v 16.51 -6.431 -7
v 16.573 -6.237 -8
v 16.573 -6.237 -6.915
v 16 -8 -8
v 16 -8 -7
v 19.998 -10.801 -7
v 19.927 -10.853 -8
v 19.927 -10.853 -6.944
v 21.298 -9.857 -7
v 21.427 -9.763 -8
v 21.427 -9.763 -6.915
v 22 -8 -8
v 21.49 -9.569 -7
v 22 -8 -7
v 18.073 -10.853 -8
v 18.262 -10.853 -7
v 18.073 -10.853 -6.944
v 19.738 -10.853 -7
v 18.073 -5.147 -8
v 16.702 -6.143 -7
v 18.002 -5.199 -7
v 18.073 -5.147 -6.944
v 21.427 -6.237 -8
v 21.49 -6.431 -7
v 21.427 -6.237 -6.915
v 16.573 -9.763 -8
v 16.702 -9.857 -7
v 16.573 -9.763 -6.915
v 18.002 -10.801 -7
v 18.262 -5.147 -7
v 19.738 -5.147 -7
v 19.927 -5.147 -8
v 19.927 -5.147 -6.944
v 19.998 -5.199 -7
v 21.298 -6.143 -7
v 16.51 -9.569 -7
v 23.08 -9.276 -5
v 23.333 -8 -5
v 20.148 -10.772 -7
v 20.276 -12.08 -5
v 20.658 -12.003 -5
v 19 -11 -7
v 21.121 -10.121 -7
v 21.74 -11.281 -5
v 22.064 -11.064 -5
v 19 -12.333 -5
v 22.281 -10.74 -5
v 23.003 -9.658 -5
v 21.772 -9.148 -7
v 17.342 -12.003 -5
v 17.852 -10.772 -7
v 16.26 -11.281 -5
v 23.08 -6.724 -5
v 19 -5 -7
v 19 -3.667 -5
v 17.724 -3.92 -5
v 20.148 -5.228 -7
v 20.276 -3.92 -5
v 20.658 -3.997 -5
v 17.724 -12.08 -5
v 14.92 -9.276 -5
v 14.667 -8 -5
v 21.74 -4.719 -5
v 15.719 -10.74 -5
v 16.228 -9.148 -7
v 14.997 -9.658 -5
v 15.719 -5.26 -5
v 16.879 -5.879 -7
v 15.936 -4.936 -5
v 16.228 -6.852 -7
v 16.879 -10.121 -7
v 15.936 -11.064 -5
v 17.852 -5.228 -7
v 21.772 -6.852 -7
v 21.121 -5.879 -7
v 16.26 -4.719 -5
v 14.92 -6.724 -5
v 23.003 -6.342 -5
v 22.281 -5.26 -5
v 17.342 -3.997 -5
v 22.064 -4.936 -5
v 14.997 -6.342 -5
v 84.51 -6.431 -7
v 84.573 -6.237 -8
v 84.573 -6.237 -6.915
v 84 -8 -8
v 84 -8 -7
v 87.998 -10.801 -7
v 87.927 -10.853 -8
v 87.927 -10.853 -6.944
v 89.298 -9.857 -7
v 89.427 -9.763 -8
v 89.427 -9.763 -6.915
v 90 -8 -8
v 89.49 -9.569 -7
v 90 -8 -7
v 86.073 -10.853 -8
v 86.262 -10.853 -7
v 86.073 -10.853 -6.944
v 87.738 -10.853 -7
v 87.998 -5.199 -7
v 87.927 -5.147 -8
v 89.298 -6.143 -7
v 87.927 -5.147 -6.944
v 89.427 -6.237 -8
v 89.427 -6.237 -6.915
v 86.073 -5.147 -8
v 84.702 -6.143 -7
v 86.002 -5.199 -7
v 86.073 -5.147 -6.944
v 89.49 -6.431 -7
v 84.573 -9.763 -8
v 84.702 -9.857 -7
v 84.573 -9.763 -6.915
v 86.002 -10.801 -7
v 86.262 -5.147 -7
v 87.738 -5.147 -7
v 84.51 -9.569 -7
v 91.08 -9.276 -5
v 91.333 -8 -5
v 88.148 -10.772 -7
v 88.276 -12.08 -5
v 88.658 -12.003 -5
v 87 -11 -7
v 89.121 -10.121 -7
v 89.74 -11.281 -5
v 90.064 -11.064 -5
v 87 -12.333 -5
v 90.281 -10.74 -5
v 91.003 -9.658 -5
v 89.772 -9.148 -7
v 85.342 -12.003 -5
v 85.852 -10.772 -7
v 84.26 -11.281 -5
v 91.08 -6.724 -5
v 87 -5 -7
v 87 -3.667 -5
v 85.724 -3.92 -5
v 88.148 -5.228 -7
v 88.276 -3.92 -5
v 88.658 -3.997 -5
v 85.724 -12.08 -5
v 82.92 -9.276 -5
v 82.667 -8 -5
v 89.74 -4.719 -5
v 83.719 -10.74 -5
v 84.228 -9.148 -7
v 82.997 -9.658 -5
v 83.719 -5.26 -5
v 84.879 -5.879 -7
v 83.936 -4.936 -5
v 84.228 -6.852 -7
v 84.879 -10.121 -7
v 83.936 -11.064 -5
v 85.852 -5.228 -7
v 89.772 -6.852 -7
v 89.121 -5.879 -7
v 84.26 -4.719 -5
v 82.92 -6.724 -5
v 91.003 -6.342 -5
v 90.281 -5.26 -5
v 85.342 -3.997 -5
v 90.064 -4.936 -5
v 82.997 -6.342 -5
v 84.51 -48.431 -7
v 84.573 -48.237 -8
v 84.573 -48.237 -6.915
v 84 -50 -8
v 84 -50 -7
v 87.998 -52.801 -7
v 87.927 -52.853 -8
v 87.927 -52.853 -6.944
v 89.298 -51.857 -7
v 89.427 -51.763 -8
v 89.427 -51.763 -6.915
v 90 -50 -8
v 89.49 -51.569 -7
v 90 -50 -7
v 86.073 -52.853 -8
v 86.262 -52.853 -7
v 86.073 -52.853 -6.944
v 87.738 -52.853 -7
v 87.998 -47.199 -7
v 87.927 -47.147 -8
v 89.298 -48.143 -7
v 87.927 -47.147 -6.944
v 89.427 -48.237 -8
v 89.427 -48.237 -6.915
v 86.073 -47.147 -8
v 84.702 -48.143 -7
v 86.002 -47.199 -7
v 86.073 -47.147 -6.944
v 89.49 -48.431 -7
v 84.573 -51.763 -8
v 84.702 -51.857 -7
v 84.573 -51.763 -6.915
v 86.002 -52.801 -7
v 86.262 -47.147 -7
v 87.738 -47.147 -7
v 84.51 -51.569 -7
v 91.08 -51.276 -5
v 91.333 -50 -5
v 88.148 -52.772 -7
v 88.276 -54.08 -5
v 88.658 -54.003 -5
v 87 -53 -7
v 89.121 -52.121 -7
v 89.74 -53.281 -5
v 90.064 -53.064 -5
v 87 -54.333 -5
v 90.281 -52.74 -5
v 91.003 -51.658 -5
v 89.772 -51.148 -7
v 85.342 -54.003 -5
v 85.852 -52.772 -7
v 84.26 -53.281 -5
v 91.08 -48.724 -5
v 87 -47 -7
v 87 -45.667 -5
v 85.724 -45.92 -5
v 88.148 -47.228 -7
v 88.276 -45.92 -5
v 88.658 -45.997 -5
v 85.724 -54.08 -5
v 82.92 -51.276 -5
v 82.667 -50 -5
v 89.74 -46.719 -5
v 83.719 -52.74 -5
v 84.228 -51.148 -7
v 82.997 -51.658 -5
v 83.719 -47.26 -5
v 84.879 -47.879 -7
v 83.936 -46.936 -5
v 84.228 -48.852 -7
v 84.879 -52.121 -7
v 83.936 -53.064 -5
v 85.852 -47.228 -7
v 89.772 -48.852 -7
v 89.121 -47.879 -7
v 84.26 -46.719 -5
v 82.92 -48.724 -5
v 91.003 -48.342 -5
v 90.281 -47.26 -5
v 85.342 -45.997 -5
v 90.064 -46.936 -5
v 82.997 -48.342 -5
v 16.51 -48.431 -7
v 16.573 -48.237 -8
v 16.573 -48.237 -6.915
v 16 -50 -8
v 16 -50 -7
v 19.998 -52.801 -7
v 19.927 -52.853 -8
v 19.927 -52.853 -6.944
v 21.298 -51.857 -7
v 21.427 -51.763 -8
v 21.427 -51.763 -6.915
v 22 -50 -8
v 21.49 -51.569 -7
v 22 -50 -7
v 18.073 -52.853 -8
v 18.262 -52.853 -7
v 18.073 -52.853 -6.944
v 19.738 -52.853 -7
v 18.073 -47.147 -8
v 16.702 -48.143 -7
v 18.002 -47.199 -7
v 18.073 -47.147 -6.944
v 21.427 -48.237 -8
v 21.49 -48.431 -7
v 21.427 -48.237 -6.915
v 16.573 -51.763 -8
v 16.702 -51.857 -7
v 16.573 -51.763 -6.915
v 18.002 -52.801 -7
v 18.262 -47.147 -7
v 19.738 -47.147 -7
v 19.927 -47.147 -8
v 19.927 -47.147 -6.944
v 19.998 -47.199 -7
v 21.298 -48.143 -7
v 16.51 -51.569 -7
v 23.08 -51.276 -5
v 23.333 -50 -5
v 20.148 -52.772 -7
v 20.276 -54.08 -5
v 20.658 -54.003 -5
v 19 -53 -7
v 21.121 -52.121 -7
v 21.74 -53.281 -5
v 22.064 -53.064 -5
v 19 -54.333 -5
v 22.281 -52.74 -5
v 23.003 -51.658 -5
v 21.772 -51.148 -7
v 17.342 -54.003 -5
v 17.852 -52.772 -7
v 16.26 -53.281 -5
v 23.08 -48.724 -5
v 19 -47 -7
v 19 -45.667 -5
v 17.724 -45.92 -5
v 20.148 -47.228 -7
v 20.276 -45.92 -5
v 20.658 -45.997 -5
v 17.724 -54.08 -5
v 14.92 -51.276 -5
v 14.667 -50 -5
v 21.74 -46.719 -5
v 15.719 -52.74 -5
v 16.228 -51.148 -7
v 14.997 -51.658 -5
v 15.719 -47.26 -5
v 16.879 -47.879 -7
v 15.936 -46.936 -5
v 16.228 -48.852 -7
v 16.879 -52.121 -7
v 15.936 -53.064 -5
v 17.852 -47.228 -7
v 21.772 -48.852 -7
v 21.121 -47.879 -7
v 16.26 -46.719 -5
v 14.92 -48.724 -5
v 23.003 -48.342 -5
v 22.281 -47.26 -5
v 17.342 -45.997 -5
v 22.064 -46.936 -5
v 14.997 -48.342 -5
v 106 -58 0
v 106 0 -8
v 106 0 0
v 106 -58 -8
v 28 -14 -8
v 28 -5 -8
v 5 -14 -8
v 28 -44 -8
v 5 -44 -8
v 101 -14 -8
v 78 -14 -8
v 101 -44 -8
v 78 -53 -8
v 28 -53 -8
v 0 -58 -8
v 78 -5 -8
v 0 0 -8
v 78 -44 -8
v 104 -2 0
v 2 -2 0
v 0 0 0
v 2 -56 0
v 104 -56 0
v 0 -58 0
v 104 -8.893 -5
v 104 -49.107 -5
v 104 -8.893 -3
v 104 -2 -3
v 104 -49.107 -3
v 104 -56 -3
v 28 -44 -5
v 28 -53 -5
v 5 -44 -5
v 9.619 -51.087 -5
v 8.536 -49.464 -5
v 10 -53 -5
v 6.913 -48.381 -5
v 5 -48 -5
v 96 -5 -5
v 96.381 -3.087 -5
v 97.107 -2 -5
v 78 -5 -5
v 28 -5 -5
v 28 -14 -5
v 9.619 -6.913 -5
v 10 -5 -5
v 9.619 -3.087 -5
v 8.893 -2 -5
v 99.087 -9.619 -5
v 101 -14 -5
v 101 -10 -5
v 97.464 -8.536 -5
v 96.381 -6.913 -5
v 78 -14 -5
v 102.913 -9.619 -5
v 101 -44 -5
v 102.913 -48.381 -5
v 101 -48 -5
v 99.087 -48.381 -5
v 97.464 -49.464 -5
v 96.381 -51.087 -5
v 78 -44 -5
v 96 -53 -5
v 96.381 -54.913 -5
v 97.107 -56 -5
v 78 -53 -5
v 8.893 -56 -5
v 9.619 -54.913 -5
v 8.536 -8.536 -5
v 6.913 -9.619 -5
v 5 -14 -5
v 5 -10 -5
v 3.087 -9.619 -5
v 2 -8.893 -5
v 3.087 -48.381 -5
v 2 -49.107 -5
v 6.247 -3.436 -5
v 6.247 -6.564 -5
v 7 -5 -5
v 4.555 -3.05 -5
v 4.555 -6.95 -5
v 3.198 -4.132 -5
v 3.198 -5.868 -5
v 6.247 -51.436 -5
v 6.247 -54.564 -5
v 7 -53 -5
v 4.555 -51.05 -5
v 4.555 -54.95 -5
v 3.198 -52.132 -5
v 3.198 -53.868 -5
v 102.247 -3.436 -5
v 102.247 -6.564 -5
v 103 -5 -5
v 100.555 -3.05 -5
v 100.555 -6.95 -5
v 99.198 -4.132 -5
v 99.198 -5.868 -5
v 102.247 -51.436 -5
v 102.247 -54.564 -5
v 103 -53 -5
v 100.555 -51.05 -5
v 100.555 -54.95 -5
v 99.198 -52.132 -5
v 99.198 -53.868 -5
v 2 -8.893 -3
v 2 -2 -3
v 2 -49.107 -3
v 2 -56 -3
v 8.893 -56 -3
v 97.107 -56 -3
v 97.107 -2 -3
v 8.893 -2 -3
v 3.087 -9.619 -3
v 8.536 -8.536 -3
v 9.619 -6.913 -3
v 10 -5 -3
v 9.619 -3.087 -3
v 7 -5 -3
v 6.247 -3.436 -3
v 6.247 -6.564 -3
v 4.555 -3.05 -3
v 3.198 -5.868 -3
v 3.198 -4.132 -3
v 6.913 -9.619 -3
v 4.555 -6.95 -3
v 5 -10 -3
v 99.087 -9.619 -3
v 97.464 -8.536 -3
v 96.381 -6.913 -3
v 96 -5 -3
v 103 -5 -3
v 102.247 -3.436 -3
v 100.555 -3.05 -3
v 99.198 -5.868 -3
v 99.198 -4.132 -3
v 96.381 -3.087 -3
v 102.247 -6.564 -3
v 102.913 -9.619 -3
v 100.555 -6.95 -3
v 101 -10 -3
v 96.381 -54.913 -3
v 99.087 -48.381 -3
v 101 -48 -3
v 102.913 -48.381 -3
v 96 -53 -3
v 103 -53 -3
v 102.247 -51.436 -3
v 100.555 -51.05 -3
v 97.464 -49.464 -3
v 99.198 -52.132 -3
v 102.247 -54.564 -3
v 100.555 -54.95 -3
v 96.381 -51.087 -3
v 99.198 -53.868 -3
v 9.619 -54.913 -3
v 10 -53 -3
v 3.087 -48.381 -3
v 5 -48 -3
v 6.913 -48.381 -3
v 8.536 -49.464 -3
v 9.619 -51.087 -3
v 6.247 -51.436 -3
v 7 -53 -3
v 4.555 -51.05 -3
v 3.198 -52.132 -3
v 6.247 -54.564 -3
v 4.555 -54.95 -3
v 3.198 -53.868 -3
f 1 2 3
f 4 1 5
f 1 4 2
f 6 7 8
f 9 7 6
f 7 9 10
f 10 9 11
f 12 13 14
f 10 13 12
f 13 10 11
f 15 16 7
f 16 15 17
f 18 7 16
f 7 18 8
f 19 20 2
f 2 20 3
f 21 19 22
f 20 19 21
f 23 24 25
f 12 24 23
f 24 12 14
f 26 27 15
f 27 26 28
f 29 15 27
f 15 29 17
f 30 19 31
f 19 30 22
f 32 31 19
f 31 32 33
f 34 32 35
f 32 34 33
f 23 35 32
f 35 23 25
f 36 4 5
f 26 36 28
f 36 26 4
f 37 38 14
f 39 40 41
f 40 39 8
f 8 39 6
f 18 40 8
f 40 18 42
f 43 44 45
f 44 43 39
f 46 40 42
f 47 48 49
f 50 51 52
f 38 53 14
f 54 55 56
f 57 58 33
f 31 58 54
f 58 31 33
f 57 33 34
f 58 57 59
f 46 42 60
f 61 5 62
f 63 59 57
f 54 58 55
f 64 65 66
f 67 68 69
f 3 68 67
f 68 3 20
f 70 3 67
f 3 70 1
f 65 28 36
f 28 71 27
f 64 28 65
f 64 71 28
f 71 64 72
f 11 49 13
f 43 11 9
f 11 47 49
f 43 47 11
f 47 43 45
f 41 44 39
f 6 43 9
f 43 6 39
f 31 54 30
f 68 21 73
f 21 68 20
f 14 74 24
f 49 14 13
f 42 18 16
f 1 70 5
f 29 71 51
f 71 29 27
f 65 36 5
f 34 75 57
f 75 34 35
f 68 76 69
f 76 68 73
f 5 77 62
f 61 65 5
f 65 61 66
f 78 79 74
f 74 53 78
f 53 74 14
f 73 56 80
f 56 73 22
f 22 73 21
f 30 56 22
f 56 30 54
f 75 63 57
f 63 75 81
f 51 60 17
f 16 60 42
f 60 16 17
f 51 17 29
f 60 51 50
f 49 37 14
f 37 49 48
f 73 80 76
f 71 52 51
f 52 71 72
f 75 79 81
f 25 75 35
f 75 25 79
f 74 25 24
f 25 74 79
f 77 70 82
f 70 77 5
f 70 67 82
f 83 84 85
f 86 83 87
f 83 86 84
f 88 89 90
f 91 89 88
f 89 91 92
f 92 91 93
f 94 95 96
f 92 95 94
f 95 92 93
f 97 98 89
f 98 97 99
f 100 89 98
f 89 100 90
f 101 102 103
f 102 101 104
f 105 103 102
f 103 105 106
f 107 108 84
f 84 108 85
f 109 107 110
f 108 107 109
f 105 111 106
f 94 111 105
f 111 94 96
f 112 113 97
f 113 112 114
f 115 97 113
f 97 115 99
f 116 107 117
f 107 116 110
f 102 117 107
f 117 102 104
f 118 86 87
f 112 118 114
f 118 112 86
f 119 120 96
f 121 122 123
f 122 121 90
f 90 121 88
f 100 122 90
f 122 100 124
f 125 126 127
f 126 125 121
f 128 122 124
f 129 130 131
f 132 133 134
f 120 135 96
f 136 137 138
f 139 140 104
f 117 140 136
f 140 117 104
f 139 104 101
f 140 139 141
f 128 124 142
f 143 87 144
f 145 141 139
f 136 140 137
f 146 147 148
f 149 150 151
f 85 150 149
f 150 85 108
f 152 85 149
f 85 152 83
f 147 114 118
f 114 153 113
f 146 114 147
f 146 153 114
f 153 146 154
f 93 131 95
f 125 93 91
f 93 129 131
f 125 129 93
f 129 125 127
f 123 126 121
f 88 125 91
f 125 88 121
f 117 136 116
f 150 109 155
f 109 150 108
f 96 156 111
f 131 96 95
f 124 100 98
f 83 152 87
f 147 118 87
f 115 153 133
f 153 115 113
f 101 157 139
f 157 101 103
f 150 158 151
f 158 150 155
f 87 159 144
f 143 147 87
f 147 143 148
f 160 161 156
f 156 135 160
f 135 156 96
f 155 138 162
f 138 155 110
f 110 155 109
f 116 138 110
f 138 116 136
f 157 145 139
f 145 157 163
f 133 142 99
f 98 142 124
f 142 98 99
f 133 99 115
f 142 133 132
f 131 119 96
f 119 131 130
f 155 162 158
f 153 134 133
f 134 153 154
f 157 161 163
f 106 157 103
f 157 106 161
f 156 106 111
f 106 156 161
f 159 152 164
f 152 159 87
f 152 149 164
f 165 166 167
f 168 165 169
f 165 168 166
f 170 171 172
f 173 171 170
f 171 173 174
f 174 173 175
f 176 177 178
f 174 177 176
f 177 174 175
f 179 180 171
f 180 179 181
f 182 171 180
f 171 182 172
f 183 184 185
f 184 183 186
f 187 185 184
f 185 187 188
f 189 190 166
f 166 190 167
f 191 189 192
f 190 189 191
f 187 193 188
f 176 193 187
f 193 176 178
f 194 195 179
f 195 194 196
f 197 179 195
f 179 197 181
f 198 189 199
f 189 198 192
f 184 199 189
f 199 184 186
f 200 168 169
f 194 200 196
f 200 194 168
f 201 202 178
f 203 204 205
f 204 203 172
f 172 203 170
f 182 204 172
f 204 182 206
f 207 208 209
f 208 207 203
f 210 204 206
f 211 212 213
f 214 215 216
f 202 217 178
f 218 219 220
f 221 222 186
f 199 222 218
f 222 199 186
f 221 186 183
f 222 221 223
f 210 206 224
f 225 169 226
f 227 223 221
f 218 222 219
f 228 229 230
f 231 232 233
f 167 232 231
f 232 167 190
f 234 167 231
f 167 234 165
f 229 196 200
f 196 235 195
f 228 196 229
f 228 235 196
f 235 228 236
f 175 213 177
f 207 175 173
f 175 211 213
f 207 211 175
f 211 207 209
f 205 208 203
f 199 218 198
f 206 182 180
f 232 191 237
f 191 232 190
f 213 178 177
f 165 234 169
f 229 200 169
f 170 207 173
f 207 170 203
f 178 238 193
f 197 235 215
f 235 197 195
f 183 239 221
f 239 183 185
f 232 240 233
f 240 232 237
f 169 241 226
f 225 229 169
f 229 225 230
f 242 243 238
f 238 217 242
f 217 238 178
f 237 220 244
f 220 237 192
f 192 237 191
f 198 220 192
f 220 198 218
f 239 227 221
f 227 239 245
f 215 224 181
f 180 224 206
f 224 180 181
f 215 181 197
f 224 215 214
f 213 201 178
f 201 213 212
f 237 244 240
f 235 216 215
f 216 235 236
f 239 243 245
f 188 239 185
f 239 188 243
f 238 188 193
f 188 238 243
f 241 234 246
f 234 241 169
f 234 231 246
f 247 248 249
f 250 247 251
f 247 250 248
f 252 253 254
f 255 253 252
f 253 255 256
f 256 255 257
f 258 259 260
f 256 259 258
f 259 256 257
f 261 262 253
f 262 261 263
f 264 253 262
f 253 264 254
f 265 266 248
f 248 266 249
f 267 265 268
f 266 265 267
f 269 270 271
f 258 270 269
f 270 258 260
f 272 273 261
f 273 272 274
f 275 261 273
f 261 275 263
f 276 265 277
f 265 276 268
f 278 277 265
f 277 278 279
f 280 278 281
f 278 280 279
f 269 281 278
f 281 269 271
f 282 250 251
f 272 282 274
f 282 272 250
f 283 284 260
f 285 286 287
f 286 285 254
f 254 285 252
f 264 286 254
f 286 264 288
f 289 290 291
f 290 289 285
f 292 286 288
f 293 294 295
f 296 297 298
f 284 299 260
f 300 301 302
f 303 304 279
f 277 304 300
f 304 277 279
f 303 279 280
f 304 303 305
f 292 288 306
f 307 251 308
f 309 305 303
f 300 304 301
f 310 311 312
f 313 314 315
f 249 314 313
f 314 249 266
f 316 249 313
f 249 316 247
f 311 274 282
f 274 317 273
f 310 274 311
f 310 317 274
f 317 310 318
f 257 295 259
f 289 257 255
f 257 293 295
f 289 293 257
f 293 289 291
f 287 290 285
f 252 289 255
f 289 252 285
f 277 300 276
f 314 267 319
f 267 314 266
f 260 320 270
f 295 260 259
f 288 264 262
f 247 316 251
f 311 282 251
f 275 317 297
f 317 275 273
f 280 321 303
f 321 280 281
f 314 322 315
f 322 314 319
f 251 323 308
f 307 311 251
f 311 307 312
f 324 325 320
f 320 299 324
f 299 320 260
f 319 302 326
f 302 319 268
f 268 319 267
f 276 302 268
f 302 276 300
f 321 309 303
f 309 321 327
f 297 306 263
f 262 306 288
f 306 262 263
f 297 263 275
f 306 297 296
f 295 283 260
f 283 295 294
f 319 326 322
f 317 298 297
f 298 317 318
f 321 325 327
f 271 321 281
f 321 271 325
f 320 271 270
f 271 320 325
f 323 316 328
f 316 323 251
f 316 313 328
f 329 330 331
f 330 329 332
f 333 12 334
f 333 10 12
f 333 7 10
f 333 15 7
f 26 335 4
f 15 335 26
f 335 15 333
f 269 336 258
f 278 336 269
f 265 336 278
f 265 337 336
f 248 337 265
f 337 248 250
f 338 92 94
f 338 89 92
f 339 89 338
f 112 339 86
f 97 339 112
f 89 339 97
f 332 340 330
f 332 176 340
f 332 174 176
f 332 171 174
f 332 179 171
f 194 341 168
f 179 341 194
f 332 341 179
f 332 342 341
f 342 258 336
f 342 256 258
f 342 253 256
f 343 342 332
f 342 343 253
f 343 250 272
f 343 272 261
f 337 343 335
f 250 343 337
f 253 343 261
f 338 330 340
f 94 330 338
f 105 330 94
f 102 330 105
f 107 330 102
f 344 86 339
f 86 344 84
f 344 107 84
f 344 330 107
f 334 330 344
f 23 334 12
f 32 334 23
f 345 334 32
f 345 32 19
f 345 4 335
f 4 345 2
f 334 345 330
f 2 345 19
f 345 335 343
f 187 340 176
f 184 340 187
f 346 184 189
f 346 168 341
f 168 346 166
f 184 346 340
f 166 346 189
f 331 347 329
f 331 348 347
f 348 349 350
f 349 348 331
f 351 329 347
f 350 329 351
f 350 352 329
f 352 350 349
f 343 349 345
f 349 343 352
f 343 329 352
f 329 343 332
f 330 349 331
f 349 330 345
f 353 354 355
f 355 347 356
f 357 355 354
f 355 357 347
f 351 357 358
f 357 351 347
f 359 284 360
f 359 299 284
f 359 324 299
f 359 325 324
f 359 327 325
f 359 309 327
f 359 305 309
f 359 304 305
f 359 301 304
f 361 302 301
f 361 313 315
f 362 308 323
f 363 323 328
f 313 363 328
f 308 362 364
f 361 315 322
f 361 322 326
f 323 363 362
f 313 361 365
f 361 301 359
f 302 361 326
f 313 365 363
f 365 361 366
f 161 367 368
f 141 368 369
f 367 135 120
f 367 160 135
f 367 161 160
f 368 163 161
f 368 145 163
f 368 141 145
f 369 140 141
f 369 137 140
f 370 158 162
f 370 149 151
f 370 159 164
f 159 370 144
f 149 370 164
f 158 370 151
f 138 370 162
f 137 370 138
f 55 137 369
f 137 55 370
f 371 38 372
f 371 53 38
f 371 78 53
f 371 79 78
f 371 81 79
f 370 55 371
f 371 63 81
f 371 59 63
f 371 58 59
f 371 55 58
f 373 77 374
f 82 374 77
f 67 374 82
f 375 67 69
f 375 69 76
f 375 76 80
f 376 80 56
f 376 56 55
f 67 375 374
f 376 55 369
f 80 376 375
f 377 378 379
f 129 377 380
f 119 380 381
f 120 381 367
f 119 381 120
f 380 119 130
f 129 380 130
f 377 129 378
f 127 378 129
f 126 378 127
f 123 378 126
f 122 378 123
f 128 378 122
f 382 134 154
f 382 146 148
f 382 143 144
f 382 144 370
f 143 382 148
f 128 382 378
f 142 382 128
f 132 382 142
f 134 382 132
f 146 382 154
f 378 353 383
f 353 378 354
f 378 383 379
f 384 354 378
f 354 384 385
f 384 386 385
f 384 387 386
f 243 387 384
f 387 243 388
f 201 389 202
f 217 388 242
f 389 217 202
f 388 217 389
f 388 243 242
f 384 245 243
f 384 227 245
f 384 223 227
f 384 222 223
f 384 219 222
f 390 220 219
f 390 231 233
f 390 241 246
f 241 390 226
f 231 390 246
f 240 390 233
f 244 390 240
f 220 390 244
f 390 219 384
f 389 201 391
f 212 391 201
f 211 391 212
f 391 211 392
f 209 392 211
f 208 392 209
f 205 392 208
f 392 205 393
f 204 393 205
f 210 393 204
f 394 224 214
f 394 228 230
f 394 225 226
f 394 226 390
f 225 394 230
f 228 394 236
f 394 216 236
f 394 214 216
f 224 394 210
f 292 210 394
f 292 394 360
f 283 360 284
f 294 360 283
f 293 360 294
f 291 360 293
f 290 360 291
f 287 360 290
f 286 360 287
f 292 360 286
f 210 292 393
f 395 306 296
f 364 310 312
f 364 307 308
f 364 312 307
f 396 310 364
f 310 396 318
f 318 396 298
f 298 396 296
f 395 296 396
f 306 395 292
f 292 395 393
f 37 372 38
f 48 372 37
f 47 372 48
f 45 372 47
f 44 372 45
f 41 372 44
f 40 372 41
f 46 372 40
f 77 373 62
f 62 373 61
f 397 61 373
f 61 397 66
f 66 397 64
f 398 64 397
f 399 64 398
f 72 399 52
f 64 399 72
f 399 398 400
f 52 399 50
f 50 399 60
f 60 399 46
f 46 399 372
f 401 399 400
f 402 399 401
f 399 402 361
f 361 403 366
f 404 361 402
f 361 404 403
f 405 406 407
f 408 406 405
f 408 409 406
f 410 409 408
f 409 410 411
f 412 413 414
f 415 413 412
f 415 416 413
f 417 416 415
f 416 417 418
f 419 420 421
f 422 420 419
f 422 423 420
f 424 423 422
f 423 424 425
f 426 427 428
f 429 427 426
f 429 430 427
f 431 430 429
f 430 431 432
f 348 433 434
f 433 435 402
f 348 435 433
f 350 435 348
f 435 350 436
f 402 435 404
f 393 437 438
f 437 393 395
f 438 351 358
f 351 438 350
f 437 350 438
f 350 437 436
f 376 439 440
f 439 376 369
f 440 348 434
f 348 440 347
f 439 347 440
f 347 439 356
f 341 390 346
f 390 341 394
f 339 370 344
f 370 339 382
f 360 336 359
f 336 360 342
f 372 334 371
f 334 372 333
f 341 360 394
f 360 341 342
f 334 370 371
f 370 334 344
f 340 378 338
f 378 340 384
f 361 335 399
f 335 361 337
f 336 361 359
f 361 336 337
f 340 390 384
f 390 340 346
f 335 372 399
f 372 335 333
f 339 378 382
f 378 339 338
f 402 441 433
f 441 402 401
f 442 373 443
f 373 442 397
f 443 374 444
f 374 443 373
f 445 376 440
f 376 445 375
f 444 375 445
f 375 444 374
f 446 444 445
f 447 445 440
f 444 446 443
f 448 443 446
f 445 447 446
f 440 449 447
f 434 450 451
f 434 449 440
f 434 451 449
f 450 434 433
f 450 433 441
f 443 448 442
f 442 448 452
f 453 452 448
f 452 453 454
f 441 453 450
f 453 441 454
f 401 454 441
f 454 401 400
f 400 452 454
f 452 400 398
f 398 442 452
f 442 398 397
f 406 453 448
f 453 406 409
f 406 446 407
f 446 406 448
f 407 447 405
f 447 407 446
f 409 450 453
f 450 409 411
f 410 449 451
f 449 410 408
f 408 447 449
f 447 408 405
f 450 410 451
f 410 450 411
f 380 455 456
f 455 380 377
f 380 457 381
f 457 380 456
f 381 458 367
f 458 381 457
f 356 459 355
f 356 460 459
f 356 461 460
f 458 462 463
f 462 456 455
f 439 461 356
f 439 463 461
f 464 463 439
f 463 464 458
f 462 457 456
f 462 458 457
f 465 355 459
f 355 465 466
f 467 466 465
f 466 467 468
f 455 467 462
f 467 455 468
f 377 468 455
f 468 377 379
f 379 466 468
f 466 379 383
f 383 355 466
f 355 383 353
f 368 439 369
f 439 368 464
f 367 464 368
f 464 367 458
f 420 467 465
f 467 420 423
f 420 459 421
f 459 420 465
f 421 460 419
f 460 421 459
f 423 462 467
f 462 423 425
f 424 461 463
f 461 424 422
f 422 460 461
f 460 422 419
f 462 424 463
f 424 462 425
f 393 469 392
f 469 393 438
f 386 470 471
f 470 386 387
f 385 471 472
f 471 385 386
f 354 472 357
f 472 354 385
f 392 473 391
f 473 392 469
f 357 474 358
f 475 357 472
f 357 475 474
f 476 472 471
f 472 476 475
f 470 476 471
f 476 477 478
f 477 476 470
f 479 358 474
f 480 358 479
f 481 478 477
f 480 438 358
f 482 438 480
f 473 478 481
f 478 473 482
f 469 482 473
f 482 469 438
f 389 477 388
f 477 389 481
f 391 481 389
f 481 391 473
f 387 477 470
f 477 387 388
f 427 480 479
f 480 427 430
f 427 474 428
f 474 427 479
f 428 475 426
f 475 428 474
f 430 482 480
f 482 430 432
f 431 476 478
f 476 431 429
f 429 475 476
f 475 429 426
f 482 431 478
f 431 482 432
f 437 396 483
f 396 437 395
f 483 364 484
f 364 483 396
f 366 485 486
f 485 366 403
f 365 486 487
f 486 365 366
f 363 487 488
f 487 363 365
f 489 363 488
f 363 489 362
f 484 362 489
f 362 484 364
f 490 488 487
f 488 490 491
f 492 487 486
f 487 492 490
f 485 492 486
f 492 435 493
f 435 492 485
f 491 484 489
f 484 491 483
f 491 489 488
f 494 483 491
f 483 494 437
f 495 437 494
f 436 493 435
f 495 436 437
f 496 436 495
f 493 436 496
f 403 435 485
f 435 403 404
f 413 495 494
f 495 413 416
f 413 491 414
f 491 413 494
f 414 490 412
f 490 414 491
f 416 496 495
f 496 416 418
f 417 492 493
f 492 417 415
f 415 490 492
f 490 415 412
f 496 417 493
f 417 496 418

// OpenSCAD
// Give the PCB Measurements below.
// DO NOT ADD ANY EXTRA MARGIN AS THAT IS ALREADY CALCULATED

pcbwidth = 100;
pcblength = 52;

// DO NOT CHANGE ANYTHING BELOW THIS LINE
rotate(a=[180,0,0]){
	difference(){
		cube([pcbwidth+6,pcblength+6,8]);
		translate([2,2,0])
			cube([pcbwidth+2,pcblength+2,5]);
		translate([19,8,4],center=true){
			cylinder(h=10,r=3);
			cylinder(h=3,r1=5,r2=3);
		}
		translate([pcbwidth-13,8,4],center=true){
			cylinder(h=10,r=3);
			cylinder(h=3,r1=5,r2=3);
		}
		translate([pcbwidth-13,pcblength-2,4],center=true){
			cylinder(h=10,r=3);
			cylinder(h=3,r1=5,r2=3);
		}
		translate([19,pcblength-2,4],center=true){
			cylinder(h=10,r=3);
			cylinder(h=3,r1=5,r2=3);
		}
		translate([28,5,0])
			cube([pcbwidth-50,pcblength-4,8]);
		translate([5,14,0])
			cube([pcbwidth-4,pcblength-22,8]);
	}
	translate([5,5,3])
	difference(){
		cylinder(h=5,r=5);
		cylinder(h=5,r=2);
	}
	translate([pcbwidth+1,5,3])
	difference(){
		cylinder(h=5,r=5);
		cylinder(h=5,r=2);
	}
	translate([pcbwidth+1,pcblength+1,3])
	difference(){
		cylinder(h=5,r=5);
		cylinder(h=5,r=2);
	}
	translate([5,pcblength+1,3])
	difference(){
		cylinder(h=5,r=5);
		cylinder(h=5,r=2);
	}
	echo("The PCB has a dimention of ", pcbwidth, "x", pcblength, "mm");
	echo("The PCBHolder will have a final dimension of ", pcbwidth+6, "x", pcblength+6, "mm");
}
